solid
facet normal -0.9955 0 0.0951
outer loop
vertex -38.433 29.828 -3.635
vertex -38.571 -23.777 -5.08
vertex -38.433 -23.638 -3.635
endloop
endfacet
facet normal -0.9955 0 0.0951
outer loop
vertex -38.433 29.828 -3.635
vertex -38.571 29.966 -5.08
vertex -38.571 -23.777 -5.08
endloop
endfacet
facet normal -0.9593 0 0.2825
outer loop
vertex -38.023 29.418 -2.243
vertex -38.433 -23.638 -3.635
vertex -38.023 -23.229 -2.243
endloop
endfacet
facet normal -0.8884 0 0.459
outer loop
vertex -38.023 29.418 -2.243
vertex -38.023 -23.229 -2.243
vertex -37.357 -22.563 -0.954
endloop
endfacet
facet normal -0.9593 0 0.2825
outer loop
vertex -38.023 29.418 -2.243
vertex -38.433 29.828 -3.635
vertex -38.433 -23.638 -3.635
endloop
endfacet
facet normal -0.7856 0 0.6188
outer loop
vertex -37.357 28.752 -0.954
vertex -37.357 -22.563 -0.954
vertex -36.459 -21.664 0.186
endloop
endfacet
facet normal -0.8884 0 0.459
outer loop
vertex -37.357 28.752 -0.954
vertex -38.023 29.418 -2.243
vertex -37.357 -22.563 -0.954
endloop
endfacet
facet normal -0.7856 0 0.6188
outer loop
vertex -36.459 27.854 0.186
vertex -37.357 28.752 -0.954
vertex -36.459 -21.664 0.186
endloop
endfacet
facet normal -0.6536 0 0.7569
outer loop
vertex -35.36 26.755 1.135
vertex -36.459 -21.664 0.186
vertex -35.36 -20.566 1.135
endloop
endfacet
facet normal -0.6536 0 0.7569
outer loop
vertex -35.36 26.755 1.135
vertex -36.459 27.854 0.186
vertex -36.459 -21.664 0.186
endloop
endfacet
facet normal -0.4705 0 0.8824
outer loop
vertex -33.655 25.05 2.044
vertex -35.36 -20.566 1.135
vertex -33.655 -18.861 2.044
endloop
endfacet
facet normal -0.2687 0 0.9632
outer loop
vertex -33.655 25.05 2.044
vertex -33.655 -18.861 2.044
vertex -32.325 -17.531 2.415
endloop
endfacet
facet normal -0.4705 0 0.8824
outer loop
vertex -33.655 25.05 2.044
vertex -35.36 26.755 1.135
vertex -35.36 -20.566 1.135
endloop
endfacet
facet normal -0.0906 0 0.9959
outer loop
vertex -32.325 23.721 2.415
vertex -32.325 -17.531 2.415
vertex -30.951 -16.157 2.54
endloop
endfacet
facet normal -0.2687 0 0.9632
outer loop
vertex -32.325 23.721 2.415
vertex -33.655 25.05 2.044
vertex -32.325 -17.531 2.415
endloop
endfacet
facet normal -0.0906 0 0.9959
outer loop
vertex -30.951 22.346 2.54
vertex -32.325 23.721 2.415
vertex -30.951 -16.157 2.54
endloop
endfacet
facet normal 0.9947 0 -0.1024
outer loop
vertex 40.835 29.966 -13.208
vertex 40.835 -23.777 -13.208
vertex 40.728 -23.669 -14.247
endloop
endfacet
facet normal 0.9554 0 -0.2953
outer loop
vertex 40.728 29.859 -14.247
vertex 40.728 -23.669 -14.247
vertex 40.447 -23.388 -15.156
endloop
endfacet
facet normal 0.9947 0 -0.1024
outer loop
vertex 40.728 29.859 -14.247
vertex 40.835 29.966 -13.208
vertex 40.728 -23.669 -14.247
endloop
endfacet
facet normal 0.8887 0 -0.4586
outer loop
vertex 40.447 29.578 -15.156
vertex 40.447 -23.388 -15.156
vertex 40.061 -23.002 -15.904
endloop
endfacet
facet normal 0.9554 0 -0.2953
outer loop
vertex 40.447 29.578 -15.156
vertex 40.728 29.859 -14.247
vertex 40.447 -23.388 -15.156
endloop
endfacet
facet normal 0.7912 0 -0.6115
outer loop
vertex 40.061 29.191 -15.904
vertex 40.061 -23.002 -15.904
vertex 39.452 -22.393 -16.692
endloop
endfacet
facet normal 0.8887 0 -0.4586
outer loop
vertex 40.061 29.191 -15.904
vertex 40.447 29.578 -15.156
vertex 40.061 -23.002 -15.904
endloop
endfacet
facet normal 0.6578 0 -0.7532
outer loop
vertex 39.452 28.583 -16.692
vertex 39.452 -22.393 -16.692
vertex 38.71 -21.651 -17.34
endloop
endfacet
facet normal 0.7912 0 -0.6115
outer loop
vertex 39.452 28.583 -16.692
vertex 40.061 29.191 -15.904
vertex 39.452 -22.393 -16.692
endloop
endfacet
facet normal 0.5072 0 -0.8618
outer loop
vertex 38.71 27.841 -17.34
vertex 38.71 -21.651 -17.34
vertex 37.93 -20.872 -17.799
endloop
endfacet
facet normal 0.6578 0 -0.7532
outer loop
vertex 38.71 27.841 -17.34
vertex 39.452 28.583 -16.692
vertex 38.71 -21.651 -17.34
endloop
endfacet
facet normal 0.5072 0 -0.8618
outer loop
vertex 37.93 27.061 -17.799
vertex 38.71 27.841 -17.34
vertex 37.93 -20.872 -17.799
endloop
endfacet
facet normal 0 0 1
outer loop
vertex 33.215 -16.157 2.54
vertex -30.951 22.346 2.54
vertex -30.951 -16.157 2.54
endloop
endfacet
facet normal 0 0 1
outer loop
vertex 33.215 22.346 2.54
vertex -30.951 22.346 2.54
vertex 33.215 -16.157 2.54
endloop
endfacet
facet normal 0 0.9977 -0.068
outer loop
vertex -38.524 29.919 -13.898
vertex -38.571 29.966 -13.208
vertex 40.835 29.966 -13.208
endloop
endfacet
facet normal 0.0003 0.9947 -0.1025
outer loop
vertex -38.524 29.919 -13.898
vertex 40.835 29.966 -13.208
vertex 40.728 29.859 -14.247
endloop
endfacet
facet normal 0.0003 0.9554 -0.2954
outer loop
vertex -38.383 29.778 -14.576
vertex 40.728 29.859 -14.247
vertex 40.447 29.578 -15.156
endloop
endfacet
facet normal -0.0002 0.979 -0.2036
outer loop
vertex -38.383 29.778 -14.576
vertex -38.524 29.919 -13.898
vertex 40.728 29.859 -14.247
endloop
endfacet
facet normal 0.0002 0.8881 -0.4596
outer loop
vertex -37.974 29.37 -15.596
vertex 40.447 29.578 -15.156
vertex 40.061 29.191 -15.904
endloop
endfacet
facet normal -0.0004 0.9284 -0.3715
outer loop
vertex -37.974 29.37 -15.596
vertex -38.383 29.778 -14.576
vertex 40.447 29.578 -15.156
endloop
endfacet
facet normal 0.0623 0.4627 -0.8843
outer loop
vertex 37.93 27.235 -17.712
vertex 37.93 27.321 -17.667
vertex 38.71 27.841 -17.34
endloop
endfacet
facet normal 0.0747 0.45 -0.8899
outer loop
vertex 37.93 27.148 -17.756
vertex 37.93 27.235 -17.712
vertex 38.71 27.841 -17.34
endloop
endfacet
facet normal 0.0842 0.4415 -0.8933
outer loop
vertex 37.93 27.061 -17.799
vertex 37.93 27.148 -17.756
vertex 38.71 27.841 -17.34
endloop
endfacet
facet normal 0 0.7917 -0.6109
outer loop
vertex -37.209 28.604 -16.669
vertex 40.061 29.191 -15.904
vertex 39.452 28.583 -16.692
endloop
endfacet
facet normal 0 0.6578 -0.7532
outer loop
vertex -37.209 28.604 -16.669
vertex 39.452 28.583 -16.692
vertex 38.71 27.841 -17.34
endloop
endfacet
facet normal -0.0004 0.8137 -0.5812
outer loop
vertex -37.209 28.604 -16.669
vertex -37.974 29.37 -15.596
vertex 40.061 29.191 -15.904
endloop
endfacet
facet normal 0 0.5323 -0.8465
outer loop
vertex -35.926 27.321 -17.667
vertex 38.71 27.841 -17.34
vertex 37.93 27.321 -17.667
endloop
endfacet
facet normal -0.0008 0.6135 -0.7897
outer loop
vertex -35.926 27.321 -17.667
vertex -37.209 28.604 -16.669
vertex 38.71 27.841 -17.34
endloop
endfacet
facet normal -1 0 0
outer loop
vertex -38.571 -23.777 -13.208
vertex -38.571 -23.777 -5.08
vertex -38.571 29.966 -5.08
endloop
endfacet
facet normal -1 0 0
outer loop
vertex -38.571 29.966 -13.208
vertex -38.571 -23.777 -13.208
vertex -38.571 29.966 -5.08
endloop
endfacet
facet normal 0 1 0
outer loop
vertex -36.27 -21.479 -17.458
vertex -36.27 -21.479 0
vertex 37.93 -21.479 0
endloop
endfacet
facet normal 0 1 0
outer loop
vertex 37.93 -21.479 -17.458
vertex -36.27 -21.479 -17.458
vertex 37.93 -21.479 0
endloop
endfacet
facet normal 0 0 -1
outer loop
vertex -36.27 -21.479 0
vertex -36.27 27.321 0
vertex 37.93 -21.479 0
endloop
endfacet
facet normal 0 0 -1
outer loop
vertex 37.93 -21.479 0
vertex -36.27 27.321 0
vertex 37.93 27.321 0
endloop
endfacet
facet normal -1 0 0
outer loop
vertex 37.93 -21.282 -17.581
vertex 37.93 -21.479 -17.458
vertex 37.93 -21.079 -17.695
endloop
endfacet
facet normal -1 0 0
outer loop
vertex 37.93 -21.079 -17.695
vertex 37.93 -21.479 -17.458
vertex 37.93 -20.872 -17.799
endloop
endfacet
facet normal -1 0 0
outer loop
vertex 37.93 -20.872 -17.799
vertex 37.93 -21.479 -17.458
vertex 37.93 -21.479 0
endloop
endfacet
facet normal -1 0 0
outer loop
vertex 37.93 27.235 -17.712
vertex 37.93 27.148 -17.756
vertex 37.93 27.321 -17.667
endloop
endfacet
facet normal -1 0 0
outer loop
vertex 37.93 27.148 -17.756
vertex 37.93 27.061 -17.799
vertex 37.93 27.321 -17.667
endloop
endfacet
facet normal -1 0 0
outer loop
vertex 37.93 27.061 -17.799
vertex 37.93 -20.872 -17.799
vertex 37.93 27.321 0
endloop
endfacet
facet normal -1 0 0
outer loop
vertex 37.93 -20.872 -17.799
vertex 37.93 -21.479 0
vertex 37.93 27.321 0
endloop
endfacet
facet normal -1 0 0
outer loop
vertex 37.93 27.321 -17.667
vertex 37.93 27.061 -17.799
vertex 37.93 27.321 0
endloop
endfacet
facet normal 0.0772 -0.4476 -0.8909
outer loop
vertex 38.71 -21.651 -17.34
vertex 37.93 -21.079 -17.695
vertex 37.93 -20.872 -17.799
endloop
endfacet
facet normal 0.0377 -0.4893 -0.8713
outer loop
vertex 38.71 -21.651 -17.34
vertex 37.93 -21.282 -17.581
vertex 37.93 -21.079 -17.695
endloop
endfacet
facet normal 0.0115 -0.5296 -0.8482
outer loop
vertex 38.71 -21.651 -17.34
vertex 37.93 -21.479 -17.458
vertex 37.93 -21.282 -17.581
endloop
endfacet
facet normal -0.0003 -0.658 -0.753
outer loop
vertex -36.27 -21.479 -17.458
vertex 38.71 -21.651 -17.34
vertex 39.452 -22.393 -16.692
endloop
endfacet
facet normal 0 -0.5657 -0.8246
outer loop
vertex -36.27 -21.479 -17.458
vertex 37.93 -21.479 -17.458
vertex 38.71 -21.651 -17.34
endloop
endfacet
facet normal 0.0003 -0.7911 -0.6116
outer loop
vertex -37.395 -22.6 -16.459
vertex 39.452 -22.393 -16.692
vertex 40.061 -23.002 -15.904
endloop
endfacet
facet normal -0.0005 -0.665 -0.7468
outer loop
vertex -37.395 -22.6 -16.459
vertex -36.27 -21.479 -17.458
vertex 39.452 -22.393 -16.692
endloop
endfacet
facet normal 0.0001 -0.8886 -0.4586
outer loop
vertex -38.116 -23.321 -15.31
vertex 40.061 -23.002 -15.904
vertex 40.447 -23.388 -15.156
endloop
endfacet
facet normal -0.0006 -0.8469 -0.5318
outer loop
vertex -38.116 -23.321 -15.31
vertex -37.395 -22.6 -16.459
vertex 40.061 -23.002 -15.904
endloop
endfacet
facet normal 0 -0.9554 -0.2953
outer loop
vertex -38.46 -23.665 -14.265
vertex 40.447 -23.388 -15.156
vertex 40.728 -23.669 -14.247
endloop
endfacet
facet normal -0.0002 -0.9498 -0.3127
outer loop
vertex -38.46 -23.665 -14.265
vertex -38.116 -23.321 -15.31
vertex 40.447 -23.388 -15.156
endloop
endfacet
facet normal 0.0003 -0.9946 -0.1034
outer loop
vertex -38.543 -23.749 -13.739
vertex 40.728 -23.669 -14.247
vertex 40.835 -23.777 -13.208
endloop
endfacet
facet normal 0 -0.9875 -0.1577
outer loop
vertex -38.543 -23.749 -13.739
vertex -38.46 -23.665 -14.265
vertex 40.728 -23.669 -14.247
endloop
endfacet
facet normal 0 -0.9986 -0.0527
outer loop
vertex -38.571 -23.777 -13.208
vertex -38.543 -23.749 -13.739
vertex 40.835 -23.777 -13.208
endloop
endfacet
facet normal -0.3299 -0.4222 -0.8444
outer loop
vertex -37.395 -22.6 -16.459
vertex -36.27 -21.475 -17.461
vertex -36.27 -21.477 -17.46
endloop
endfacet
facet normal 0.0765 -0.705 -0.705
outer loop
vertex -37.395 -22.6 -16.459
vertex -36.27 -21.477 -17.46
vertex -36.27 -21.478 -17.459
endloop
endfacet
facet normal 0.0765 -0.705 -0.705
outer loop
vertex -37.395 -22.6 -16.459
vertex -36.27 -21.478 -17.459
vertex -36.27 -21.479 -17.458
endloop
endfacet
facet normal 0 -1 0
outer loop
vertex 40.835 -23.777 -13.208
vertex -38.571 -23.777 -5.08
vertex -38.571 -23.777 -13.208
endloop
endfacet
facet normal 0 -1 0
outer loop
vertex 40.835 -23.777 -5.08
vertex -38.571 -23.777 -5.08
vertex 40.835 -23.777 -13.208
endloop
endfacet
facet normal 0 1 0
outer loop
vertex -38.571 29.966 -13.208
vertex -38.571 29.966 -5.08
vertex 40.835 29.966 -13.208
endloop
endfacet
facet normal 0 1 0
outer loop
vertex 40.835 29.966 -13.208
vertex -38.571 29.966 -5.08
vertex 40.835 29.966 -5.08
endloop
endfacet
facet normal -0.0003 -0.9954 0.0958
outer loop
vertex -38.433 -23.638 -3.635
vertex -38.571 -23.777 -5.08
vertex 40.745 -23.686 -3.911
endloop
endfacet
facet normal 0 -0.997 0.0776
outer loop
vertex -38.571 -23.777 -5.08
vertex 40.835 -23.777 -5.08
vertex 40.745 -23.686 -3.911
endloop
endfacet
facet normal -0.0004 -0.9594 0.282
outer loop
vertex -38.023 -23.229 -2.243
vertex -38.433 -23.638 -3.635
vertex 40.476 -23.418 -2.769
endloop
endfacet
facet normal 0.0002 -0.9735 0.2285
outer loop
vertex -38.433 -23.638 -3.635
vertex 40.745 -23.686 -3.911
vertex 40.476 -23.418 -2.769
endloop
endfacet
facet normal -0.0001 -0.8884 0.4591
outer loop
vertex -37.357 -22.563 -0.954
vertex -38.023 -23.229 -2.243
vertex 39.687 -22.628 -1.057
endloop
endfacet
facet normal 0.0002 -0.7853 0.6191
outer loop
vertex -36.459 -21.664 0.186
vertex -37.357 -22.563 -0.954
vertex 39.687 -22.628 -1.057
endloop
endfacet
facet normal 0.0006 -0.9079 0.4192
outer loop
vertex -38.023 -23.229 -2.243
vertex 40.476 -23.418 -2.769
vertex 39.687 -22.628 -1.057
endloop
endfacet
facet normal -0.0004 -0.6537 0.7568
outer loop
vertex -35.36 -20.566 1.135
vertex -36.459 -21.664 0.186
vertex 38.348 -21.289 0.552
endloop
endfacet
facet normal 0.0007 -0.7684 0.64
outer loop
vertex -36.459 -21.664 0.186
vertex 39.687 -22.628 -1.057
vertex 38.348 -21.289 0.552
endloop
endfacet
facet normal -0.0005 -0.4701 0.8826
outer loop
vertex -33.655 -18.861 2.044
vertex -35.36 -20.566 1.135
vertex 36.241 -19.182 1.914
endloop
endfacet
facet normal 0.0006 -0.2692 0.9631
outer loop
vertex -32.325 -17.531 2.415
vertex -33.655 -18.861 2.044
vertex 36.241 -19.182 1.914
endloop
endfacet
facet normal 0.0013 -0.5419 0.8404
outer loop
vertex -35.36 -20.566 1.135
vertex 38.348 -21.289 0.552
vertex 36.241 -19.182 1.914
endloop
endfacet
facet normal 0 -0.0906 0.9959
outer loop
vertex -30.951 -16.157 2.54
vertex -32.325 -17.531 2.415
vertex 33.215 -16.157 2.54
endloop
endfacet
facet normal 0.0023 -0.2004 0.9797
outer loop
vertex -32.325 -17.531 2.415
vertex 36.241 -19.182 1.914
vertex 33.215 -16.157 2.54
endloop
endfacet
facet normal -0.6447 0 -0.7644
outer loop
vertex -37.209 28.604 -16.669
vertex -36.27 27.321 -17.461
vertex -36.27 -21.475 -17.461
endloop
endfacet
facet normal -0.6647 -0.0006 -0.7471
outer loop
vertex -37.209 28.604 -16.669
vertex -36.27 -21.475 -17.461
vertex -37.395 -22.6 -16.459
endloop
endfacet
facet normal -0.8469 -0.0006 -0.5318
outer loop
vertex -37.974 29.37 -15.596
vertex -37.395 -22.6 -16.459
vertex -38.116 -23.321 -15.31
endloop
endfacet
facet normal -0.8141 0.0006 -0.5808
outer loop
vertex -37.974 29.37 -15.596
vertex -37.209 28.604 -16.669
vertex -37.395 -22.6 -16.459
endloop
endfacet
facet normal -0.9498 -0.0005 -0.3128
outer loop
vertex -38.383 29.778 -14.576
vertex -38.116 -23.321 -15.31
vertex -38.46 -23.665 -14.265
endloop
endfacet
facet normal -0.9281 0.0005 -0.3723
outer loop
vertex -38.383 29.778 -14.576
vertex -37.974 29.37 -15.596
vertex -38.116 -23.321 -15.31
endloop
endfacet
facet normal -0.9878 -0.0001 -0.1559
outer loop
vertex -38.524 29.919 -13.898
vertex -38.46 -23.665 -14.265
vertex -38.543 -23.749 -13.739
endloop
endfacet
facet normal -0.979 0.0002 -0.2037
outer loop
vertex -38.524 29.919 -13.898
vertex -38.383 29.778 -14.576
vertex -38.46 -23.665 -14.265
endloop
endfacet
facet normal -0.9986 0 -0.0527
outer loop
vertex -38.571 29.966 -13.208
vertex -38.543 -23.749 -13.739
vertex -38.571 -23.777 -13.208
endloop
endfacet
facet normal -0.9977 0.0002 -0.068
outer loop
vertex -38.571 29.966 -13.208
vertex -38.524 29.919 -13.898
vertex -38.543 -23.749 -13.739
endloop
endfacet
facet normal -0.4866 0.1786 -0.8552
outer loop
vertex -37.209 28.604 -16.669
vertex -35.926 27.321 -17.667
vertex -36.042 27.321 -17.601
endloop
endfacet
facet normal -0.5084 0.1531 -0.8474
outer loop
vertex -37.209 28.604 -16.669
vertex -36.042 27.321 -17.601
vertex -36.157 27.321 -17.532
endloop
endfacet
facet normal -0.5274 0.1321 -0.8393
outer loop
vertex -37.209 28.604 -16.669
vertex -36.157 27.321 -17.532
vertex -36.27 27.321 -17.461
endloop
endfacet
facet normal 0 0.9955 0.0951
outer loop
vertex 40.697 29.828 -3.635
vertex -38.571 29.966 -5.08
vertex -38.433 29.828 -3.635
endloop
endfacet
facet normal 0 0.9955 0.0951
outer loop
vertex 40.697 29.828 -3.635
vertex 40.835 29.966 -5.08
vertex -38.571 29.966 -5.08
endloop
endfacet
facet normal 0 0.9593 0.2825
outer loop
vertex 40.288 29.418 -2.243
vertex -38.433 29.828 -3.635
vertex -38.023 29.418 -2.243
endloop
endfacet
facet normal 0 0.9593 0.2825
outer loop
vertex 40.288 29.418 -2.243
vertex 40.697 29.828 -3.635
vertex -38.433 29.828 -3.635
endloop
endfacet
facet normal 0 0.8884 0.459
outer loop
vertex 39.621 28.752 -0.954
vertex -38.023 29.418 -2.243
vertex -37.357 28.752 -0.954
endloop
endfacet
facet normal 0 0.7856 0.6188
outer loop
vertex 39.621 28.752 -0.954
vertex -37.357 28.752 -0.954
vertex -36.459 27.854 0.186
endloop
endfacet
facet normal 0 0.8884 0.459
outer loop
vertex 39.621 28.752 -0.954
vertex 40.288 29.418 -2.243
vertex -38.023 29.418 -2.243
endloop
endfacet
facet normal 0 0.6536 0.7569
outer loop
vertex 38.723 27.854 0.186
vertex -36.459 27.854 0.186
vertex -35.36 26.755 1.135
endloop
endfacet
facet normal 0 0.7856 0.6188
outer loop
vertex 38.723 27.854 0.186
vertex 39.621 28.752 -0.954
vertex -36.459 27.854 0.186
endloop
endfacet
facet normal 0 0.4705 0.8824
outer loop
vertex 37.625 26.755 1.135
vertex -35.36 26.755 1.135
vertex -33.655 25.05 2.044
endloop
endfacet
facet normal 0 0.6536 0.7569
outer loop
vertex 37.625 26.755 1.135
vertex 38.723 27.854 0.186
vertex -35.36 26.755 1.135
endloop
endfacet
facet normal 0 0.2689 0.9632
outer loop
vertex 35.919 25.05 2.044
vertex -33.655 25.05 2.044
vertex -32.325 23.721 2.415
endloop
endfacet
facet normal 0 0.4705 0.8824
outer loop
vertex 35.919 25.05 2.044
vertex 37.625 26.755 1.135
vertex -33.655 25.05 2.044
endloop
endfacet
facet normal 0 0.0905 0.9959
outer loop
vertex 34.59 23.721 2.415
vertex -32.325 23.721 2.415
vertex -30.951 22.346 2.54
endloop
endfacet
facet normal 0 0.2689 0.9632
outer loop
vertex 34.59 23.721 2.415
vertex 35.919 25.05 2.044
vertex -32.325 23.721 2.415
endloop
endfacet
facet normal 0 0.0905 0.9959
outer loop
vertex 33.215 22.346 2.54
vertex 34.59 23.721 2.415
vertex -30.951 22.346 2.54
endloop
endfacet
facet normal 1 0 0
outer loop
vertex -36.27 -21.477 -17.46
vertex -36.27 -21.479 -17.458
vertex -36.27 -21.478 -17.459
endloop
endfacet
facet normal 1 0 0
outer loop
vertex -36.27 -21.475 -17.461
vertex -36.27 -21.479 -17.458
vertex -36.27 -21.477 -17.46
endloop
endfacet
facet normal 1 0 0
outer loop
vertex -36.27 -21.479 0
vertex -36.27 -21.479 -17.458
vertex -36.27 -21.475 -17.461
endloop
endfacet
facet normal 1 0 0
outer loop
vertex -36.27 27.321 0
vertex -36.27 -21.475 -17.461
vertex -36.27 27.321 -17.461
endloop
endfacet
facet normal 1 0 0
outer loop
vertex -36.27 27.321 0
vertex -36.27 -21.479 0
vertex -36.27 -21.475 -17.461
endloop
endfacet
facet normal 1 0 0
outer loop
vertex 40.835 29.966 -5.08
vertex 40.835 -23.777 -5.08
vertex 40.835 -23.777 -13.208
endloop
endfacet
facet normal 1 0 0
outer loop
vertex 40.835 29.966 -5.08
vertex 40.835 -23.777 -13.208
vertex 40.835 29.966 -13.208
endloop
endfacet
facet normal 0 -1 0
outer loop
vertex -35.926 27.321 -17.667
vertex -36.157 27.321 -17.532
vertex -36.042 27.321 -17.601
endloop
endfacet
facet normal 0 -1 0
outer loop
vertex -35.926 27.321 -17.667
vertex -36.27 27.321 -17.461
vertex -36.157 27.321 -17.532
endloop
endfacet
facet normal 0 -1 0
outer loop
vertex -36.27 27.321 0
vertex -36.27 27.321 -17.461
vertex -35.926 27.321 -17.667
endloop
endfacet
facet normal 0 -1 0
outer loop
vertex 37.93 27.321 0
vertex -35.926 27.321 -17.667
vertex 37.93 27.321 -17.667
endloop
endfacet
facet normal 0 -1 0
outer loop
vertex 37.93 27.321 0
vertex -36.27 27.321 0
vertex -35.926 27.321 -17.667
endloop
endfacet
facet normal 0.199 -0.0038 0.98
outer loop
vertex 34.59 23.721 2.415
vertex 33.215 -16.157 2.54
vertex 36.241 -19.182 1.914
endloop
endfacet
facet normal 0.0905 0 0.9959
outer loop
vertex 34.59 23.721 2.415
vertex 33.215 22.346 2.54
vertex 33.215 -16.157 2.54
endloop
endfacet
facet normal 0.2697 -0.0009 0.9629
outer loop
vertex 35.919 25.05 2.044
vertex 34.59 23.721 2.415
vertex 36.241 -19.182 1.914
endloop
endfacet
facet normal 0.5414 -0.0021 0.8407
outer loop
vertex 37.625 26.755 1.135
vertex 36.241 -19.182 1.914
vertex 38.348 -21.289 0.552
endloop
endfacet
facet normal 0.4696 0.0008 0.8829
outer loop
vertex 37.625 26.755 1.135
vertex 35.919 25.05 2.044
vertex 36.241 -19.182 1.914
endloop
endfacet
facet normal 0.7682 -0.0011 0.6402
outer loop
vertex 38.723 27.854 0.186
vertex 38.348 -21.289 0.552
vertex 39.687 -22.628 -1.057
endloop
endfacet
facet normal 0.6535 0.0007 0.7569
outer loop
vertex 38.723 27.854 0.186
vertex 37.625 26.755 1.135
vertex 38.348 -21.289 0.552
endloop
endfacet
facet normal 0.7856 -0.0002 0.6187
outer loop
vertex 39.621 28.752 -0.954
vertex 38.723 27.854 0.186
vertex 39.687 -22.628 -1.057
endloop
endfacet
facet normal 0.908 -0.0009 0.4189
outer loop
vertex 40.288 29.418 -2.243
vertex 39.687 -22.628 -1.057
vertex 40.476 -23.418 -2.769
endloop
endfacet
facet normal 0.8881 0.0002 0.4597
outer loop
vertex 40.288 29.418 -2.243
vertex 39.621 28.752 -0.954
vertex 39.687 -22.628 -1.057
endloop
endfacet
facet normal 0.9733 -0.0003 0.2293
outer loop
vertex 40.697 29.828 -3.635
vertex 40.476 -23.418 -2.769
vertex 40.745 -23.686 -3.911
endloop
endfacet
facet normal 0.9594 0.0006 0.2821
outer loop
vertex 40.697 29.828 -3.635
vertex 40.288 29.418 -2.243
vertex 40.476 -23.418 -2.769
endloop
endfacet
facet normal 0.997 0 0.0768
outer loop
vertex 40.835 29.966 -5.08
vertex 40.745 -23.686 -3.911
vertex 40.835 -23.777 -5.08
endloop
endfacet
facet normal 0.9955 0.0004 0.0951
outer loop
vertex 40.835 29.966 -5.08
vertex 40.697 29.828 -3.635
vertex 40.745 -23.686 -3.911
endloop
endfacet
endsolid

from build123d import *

# Parameters (mm, degrees)
F0_W        = 74.2
F0_H        = 48.8
F1_DEPTH    = 2.54
F2_W        = 79.4061459601
F2_H        = 53.7425726652
F2_W_2      = 74.2
F2_H_2      = 48.8
F3_DEPTH    = 20.828
F4_R        = 7.62
F5_T1_DEPTH = 79.1425726652
F5_T3_DEPTH = 104.8061459601


# Not quite as in the source:
# - a fillet or chamfer that OpenCascade refuses, or shapes differently, is made with other operations: its cross-section is extruded or revolved along the edge and cut away or added


with BuildPart() as f1:
    # F0 (on Top) → F1 (new body)
    with BuildSketch(Plane.XY):
        with Locations((0.8302908391, 2.9207762395)):
            Rectangle(F0_W, F0_H)
    extrude(amount=F1_DEPTH)

    # F2 (on face) → F3 (join)
    with BuildSketch(Plane.XY.offset(2.54)):
        with Locations((1.1322144419, 3.0947271734)):
            Rectangle(F2_W, F2_H)
        with Locations((0.8302908391, 2.9207762395)):
            Rectangle(F2_W_2, F2_H_2, mode=Mode.SUBTRACT)
    extrude(amount=-F3_DEPTH)

    # F4
    f4_edges = [f1.edges().sort_by_distance(p)[0] for p in [
        (1.132214, 29.966014, 2.54),
        (-38.570859, 3.094727, 2.54),
        (40.835287, 3.094727, 2.54),
        (1.132214, -23.776559, 2.54),
    ]]
    fillet(f4_edges, radius=F4_R)

    # F5: fillet of radius 5.08 on 4 edges, made by hand

    # F5_s2 → F5_t1 (cut)
    with BuildSketch(Plane.XZ.offset(-42.6660135061)):
        with BuildLine():
            ThreePointArc((40.8352874219, -13.208), (39.3473898704, -16.8001024484), (35.7552874219, -18.288))
            Line((35.7552874219, -18.288), (40.8352874219, -18.288))
            Line((40.8352874219, -18.288), (40.8352874219, -13.208))
        make_face()
        with BuildLine():
            ThreePointArc((-33.4908585382, -18.288), (-37.0829609866, -16.8001024484), (-38.5708585382, -13.208))
            Line((-38.5708585382, -13.208), (-38.5708585382, -18.288))
            Line((-38.5708585382, -18.288), (-33.4908585382, -18.288))
        make_face()
    extrude(amount=F5_T1_DEPTH, mode=Mode.SUBTRACT)

    # F5_s4 → F5_t3 (cut)
    with BuildSketch(Plane.YZ.offset(-51.2708585382)):
        with BuildLine():
            ThreePointArc((-18.6965591592, -18.288), (-22.2886616076, -16.8001024484), (-23.7765591592, -13.208))
            Line((-23.7765591592, -13.208), (-23.7765591592, -18.288))
            Line((-23.7765591592, -18.288), (-18.6965591592, -18.288))
        make_face()
        with BuildLine():
            ThreePointArc((29.9660135061, -13.208), (28.4781159545, -16.8001024484), (24.8860135061, -18.288))
            Line((24.8860135061, -18.288), (29.9660135061, -18.288))
            Line((29.9660135061, -18.288), (29.9660135061, -13.208))
        make_face()
    extrude(amount=F5_T3_DEPTH, mode=Mode.SUBTRACT)


solid = f1.part
